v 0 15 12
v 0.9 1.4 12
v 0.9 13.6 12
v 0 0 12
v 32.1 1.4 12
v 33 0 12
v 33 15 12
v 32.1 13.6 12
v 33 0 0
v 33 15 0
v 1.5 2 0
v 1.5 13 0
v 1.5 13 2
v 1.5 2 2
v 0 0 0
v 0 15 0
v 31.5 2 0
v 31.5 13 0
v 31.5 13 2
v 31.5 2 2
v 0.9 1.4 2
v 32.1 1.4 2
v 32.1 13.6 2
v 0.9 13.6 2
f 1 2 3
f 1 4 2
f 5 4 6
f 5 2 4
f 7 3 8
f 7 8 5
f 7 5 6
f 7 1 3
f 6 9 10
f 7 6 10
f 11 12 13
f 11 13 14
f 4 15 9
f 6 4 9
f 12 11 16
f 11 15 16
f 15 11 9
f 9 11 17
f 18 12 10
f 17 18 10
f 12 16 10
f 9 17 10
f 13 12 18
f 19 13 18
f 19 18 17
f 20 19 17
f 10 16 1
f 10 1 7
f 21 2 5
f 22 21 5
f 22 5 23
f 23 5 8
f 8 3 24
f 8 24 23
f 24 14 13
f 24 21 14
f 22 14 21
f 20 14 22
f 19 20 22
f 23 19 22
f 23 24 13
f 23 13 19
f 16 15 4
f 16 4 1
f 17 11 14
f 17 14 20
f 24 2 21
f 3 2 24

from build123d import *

# Parameters (mm, degrees)
F0_W     = 33
F0_H     = 15
F1_DEPTH = 12
F2_W     = 31.2
F2_H     = 12.2
F3_DEPTH = 10
F4_W     = 30
F4_H     = 11
F5_DEPTH = 12.001


with BuildPart() as f1:
    # F0 (on Top) → F1 (new body)
    with BuildSketch(Plane.XY):
        with Locations((16.5, 7.5)):
            Rectangle(F0_W, F0_H)
    extrude(amount=F1_DEPTH)

    # F2 (on face) → F3 (cut)
    with BuildSketch(Plane.XY.offset(12)):
        with Locations((16.5, 7.5)):
            Rectangle(F2_W, F2_H)
    extrude(amount=-F3_DEPTH, mode=Mode.SUBTRACT)

    # F4 (on face) → F5 (cut, through all)
    with BuildSketch(Plane(origin=(0, 0, 0), x_dir=(1, 0, 0), z_dir=(0, 0, -1))):
        with Locations((16.5, -7.5)):
            Rectangle(F4_W, F4_H)
    extrude(amount=-F5_DEPTH, mode=Mode.SUBTRACT)


solid = f1.part
